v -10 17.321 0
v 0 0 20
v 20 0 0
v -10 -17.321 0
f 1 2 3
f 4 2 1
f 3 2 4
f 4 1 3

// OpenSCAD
//-- Cilindro normal, r es el radio, h es la altura
*cylinder(r=20,h=20,$fn=100);

//-- Cono truncado, r1 es el radio de la base inferior, r2 radio de la base superior
*cylinder(r1=20,r2=10, h=20,$fn=100);

//-- Cono
*cylinder(r1=20,r2=0, h=20,$fn=100);

//-- Piramide de base hexagonal
*cylinder(r1=20,r2=10, h=20,$fn=6);

//-- Piramide
*cylinder(r1=20,r2=0, h=20,$fn=4);

//-- Tetraedro
cylinder(r1=20,r2=0, h=20,$fn=3);
